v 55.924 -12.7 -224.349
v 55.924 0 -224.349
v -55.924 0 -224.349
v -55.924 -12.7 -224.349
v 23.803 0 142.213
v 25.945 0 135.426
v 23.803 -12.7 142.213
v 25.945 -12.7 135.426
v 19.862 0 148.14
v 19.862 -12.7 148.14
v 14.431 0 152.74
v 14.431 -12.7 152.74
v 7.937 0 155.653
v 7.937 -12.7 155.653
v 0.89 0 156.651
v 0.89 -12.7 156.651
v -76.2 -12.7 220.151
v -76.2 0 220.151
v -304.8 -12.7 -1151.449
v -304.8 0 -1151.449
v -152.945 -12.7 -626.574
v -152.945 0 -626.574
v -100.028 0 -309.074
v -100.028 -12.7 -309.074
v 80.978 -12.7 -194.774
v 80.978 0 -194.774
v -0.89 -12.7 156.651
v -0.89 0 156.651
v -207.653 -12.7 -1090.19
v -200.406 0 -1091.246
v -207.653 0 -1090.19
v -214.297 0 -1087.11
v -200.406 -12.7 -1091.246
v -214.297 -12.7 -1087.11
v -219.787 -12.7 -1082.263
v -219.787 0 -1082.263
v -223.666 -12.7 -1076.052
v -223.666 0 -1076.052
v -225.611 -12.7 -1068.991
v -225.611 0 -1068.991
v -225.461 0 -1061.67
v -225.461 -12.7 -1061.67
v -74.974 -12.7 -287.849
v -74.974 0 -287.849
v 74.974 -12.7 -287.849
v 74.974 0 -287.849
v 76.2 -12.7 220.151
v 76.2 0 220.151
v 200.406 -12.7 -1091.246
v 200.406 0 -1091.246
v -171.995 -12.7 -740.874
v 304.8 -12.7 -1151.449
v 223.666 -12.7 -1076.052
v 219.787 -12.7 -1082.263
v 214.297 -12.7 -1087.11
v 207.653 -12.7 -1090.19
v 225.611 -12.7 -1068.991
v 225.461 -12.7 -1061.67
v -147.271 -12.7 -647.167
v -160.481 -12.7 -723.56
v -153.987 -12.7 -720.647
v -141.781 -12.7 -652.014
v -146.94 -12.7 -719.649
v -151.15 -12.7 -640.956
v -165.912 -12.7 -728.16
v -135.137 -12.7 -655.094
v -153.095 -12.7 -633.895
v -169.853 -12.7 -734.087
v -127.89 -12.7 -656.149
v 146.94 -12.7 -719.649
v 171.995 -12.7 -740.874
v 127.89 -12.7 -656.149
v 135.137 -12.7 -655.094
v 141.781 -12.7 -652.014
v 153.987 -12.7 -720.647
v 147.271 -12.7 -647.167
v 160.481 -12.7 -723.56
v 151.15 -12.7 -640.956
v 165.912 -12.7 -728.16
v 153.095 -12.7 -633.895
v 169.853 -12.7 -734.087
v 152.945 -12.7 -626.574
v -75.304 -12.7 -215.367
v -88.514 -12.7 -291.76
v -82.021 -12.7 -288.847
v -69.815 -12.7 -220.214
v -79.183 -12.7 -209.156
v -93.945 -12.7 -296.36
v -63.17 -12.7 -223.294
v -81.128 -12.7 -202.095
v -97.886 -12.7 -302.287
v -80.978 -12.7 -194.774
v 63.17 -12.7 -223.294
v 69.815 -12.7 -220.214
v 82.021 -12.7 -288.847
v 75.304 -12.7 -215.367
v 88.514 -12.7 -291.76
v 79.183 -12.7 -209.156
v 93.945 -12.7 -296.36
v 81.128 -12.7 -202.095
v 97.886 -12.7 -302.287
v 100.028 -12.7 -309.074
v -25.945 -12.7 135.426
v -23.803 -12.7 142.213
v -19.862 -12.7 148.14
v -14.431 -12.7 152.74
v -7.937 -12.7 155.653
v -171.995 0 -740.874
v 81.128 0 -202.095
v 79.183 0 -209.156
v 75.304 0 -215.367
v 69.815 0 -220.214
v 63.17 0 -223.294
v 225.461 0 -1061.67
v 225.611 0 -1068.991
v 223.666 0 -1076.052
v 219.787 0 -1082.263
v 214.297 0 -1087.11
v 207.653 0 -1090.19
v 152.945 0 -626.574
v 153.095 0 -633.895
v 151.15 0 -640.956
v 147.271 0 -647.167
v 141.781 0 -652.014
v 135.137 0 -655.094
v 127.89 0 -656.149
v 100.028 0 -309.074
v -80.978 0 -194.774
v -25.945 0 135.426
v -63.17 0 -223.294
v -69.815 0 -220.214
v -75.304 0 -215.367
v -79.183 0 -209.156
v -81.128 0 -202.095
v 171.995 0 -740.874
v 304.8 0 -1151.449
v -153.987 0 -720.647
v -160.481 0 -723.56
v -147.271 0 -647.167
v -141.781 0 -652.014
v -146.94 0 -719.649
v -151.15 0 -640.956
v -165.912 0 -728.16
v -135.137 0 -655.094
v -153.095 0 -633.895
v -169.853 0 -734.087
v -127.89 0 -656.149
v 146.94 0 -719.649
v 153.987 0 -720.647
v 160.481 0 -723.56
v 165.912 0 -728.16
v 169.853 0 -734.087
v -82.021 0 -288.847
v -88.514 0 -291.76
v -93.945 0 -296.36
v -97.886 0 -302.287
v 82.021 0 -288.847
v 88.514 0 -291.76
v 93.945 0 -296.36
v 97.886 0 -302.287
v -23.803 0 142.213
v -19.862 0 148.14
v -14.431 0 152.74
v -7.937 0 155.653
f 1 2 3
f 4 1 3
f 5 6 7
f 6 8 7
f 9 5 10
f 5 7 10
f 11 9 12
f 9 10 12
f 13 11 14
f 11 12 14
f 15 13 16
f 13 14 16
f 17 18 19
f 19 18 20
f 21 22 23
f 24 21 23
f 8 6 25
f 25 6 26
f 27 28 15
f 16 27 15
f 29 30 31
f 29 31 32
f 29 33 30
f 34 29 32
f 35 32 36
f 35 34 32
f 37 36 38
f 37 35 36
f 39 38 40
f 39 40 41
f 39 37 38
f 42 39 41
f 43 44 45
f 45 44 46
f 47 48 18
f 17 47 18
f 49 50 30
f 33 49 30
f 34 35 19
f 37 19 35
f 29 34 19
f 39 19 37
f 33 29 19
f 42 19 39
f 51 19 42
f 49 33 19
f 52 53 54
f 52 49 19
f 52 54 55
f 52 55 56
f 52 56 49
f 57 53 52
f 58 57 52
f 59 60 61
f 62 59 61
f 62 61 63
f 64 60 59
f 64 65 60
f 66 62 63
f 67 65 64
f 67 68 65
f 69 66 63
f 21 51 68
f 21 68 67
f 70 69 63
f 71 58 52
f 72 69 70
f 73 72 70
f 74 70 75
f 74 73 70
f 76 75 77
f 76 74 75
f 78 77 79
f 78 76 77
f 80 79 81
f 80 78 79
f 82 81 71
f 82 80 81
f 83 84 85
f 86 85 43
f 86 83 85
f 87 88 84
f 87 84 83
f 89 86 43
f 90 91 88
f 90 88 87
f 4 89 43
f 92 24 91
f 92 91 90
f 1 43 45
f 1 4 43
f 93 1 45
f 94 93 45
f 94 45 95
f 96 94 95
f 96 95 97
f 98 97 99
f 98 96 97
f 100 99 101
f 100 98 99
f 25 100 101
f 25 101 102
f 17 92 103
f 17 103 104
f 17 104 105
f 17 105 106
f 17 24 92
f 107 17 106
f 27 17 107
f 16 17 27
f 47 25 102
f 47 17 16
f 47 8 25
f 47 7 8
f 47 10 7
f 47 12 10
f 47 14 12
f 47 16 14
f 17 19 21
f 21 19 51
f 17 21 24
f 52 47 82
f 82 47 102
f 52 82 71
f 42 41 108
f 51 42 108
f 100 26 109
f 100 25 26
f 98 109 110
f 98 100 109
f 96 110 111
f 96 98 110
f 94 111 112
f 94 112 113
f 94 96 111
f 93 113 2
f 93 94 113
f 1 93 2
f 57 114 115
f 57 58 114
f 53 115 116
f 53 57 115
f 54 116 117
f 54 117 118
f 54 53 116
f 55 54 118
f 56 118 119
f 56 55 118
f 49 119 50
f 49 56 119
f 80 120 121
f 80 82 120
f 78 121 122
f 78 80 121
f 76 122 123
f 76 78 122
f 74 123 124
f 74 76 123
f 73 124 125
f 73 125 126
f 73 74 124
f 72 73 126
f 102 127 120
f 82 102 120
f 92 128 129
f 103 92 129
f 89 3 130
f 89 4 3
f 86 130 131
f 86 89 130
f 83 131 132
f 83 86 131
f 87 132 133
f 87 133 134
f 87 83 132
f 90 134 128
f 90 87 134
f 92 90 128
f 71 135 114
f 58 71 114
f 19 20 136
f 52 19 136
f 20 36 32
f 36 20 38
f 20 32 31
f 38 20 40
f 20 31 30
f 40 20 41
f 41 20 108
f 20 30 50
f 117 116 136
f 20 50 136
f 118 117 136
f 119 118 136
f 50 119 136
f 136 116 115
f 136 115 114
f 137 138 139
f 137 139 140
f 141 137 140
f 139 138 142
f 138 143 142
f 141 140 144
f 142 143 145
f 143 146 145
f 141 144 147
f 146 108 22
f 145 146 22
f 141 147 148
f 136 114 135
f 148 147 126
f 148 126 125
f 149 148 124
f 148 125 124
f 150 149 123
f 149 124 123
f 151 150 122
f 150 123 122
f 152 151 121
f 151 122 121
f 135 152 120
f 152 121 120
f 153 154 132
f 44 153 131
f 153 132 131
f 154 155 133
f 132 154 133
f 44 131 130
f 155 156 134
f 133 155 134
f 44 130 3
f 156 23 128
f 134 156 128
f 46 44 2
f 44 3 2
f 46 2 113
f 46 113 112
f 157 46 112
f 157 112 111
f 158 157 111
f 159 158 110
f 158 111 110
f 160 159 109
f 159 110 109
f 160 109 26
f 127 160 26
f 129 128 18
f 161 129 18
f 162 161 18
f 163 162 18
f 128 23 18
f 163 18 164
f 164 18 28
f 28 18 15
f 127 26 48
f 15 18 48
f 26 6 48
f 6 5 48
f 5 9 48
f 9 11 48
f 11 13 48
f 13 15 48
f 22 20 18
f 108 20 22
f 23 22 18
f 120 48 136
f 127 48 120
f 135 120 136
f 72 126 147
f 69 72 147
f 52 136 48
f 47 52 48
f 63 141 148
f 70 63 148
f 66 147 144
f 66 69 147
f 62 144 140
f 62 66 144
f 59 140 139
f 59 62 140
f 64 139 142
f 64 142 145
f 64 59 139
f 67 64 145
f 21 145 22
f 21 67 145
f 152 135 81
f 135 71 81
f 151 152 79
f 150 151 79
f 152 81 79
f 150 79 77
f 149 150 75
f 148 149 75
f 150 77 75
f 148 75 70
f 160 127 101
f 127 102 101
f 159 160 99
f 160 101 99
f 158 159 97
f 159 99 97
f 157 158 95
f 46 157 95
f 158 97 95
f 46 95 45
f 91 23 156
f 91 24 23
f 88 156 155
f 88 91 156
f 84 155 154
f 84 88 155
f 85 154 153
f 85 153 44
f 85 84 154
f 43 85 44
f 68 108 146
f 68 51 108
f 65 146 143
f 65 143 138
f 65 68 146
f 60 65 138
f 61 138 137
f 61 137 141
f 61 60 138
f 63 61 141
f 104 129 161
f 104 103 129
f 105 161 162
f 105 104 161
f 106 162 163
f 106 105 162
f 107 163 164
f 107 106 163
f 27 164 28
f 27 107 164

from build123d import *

# Parameters (mm, degrees)
F1_DEPTH = 12.7
F2_R     = 25.4


with BuildPart() as f1:
    # F0 (on Front) → F1 (new body)
    with BuildSketch(Plane.XZ):
        Polygon((76.2, 220.150558), (0, 220.150558), (-76.2, 220.150558), (-304.8, -1151.449442), (0, -1151.449442), (304.8, -1151.449442), align=None)
        Polygon((230.390112, -1091.245532), (0, -1091.245532), (-230.390112, -1091.245532), (-168.45743, -719.649442), (0, -719.649442), (168.45743, -719.649442), align=None, mode=Mode.SUBTRACT)
        Polygon((157.874097, -656.149442), (0, -656.149442), (-157.874097, -656.149442), (-96.490763, -287.849442), (0, -287.849442), (96.490763, -287.849442), align=None, mode=Mode.SUBTRACT)
        Polygon((85.90743, -224.349442), (0, -224.349442), (-85.90743, -224.349442), (-22.40743, 156.650558), (0, 156.650558), (22.40743, 156.650558), align=None, mode=Mode.SUBTRACT)
    extrude(amount=F1_DEPTH)

    # F2
    f2_edges = [f1.edges().sort_by_distance(p)[0] for p in [
        (-85.90743, -6.35, -224.349442),
        (85.90743, -6.35, -224.349442),
        (22.40743, -6.35, 156.650558),
        (-22.40743, -6.35, 156.650558),
        (-96.490763, -6.35, -287.849442),
        (96.490763, -6.35, -287.849442),
        (157.874097, -6.35, -656.149442),
        (-157.874097, -6.35, -656.149442),
        (-230.390112, -6.35, -1091.245532),
        (168.45743, -6.35, -719.649442),
        (230.390112, -6.35, -1091.245532),
        (-168.45743, -6.35, -719.649442),
    ]]
    fillet(f2_edges, radius=F2_R)


solid = f1.part
